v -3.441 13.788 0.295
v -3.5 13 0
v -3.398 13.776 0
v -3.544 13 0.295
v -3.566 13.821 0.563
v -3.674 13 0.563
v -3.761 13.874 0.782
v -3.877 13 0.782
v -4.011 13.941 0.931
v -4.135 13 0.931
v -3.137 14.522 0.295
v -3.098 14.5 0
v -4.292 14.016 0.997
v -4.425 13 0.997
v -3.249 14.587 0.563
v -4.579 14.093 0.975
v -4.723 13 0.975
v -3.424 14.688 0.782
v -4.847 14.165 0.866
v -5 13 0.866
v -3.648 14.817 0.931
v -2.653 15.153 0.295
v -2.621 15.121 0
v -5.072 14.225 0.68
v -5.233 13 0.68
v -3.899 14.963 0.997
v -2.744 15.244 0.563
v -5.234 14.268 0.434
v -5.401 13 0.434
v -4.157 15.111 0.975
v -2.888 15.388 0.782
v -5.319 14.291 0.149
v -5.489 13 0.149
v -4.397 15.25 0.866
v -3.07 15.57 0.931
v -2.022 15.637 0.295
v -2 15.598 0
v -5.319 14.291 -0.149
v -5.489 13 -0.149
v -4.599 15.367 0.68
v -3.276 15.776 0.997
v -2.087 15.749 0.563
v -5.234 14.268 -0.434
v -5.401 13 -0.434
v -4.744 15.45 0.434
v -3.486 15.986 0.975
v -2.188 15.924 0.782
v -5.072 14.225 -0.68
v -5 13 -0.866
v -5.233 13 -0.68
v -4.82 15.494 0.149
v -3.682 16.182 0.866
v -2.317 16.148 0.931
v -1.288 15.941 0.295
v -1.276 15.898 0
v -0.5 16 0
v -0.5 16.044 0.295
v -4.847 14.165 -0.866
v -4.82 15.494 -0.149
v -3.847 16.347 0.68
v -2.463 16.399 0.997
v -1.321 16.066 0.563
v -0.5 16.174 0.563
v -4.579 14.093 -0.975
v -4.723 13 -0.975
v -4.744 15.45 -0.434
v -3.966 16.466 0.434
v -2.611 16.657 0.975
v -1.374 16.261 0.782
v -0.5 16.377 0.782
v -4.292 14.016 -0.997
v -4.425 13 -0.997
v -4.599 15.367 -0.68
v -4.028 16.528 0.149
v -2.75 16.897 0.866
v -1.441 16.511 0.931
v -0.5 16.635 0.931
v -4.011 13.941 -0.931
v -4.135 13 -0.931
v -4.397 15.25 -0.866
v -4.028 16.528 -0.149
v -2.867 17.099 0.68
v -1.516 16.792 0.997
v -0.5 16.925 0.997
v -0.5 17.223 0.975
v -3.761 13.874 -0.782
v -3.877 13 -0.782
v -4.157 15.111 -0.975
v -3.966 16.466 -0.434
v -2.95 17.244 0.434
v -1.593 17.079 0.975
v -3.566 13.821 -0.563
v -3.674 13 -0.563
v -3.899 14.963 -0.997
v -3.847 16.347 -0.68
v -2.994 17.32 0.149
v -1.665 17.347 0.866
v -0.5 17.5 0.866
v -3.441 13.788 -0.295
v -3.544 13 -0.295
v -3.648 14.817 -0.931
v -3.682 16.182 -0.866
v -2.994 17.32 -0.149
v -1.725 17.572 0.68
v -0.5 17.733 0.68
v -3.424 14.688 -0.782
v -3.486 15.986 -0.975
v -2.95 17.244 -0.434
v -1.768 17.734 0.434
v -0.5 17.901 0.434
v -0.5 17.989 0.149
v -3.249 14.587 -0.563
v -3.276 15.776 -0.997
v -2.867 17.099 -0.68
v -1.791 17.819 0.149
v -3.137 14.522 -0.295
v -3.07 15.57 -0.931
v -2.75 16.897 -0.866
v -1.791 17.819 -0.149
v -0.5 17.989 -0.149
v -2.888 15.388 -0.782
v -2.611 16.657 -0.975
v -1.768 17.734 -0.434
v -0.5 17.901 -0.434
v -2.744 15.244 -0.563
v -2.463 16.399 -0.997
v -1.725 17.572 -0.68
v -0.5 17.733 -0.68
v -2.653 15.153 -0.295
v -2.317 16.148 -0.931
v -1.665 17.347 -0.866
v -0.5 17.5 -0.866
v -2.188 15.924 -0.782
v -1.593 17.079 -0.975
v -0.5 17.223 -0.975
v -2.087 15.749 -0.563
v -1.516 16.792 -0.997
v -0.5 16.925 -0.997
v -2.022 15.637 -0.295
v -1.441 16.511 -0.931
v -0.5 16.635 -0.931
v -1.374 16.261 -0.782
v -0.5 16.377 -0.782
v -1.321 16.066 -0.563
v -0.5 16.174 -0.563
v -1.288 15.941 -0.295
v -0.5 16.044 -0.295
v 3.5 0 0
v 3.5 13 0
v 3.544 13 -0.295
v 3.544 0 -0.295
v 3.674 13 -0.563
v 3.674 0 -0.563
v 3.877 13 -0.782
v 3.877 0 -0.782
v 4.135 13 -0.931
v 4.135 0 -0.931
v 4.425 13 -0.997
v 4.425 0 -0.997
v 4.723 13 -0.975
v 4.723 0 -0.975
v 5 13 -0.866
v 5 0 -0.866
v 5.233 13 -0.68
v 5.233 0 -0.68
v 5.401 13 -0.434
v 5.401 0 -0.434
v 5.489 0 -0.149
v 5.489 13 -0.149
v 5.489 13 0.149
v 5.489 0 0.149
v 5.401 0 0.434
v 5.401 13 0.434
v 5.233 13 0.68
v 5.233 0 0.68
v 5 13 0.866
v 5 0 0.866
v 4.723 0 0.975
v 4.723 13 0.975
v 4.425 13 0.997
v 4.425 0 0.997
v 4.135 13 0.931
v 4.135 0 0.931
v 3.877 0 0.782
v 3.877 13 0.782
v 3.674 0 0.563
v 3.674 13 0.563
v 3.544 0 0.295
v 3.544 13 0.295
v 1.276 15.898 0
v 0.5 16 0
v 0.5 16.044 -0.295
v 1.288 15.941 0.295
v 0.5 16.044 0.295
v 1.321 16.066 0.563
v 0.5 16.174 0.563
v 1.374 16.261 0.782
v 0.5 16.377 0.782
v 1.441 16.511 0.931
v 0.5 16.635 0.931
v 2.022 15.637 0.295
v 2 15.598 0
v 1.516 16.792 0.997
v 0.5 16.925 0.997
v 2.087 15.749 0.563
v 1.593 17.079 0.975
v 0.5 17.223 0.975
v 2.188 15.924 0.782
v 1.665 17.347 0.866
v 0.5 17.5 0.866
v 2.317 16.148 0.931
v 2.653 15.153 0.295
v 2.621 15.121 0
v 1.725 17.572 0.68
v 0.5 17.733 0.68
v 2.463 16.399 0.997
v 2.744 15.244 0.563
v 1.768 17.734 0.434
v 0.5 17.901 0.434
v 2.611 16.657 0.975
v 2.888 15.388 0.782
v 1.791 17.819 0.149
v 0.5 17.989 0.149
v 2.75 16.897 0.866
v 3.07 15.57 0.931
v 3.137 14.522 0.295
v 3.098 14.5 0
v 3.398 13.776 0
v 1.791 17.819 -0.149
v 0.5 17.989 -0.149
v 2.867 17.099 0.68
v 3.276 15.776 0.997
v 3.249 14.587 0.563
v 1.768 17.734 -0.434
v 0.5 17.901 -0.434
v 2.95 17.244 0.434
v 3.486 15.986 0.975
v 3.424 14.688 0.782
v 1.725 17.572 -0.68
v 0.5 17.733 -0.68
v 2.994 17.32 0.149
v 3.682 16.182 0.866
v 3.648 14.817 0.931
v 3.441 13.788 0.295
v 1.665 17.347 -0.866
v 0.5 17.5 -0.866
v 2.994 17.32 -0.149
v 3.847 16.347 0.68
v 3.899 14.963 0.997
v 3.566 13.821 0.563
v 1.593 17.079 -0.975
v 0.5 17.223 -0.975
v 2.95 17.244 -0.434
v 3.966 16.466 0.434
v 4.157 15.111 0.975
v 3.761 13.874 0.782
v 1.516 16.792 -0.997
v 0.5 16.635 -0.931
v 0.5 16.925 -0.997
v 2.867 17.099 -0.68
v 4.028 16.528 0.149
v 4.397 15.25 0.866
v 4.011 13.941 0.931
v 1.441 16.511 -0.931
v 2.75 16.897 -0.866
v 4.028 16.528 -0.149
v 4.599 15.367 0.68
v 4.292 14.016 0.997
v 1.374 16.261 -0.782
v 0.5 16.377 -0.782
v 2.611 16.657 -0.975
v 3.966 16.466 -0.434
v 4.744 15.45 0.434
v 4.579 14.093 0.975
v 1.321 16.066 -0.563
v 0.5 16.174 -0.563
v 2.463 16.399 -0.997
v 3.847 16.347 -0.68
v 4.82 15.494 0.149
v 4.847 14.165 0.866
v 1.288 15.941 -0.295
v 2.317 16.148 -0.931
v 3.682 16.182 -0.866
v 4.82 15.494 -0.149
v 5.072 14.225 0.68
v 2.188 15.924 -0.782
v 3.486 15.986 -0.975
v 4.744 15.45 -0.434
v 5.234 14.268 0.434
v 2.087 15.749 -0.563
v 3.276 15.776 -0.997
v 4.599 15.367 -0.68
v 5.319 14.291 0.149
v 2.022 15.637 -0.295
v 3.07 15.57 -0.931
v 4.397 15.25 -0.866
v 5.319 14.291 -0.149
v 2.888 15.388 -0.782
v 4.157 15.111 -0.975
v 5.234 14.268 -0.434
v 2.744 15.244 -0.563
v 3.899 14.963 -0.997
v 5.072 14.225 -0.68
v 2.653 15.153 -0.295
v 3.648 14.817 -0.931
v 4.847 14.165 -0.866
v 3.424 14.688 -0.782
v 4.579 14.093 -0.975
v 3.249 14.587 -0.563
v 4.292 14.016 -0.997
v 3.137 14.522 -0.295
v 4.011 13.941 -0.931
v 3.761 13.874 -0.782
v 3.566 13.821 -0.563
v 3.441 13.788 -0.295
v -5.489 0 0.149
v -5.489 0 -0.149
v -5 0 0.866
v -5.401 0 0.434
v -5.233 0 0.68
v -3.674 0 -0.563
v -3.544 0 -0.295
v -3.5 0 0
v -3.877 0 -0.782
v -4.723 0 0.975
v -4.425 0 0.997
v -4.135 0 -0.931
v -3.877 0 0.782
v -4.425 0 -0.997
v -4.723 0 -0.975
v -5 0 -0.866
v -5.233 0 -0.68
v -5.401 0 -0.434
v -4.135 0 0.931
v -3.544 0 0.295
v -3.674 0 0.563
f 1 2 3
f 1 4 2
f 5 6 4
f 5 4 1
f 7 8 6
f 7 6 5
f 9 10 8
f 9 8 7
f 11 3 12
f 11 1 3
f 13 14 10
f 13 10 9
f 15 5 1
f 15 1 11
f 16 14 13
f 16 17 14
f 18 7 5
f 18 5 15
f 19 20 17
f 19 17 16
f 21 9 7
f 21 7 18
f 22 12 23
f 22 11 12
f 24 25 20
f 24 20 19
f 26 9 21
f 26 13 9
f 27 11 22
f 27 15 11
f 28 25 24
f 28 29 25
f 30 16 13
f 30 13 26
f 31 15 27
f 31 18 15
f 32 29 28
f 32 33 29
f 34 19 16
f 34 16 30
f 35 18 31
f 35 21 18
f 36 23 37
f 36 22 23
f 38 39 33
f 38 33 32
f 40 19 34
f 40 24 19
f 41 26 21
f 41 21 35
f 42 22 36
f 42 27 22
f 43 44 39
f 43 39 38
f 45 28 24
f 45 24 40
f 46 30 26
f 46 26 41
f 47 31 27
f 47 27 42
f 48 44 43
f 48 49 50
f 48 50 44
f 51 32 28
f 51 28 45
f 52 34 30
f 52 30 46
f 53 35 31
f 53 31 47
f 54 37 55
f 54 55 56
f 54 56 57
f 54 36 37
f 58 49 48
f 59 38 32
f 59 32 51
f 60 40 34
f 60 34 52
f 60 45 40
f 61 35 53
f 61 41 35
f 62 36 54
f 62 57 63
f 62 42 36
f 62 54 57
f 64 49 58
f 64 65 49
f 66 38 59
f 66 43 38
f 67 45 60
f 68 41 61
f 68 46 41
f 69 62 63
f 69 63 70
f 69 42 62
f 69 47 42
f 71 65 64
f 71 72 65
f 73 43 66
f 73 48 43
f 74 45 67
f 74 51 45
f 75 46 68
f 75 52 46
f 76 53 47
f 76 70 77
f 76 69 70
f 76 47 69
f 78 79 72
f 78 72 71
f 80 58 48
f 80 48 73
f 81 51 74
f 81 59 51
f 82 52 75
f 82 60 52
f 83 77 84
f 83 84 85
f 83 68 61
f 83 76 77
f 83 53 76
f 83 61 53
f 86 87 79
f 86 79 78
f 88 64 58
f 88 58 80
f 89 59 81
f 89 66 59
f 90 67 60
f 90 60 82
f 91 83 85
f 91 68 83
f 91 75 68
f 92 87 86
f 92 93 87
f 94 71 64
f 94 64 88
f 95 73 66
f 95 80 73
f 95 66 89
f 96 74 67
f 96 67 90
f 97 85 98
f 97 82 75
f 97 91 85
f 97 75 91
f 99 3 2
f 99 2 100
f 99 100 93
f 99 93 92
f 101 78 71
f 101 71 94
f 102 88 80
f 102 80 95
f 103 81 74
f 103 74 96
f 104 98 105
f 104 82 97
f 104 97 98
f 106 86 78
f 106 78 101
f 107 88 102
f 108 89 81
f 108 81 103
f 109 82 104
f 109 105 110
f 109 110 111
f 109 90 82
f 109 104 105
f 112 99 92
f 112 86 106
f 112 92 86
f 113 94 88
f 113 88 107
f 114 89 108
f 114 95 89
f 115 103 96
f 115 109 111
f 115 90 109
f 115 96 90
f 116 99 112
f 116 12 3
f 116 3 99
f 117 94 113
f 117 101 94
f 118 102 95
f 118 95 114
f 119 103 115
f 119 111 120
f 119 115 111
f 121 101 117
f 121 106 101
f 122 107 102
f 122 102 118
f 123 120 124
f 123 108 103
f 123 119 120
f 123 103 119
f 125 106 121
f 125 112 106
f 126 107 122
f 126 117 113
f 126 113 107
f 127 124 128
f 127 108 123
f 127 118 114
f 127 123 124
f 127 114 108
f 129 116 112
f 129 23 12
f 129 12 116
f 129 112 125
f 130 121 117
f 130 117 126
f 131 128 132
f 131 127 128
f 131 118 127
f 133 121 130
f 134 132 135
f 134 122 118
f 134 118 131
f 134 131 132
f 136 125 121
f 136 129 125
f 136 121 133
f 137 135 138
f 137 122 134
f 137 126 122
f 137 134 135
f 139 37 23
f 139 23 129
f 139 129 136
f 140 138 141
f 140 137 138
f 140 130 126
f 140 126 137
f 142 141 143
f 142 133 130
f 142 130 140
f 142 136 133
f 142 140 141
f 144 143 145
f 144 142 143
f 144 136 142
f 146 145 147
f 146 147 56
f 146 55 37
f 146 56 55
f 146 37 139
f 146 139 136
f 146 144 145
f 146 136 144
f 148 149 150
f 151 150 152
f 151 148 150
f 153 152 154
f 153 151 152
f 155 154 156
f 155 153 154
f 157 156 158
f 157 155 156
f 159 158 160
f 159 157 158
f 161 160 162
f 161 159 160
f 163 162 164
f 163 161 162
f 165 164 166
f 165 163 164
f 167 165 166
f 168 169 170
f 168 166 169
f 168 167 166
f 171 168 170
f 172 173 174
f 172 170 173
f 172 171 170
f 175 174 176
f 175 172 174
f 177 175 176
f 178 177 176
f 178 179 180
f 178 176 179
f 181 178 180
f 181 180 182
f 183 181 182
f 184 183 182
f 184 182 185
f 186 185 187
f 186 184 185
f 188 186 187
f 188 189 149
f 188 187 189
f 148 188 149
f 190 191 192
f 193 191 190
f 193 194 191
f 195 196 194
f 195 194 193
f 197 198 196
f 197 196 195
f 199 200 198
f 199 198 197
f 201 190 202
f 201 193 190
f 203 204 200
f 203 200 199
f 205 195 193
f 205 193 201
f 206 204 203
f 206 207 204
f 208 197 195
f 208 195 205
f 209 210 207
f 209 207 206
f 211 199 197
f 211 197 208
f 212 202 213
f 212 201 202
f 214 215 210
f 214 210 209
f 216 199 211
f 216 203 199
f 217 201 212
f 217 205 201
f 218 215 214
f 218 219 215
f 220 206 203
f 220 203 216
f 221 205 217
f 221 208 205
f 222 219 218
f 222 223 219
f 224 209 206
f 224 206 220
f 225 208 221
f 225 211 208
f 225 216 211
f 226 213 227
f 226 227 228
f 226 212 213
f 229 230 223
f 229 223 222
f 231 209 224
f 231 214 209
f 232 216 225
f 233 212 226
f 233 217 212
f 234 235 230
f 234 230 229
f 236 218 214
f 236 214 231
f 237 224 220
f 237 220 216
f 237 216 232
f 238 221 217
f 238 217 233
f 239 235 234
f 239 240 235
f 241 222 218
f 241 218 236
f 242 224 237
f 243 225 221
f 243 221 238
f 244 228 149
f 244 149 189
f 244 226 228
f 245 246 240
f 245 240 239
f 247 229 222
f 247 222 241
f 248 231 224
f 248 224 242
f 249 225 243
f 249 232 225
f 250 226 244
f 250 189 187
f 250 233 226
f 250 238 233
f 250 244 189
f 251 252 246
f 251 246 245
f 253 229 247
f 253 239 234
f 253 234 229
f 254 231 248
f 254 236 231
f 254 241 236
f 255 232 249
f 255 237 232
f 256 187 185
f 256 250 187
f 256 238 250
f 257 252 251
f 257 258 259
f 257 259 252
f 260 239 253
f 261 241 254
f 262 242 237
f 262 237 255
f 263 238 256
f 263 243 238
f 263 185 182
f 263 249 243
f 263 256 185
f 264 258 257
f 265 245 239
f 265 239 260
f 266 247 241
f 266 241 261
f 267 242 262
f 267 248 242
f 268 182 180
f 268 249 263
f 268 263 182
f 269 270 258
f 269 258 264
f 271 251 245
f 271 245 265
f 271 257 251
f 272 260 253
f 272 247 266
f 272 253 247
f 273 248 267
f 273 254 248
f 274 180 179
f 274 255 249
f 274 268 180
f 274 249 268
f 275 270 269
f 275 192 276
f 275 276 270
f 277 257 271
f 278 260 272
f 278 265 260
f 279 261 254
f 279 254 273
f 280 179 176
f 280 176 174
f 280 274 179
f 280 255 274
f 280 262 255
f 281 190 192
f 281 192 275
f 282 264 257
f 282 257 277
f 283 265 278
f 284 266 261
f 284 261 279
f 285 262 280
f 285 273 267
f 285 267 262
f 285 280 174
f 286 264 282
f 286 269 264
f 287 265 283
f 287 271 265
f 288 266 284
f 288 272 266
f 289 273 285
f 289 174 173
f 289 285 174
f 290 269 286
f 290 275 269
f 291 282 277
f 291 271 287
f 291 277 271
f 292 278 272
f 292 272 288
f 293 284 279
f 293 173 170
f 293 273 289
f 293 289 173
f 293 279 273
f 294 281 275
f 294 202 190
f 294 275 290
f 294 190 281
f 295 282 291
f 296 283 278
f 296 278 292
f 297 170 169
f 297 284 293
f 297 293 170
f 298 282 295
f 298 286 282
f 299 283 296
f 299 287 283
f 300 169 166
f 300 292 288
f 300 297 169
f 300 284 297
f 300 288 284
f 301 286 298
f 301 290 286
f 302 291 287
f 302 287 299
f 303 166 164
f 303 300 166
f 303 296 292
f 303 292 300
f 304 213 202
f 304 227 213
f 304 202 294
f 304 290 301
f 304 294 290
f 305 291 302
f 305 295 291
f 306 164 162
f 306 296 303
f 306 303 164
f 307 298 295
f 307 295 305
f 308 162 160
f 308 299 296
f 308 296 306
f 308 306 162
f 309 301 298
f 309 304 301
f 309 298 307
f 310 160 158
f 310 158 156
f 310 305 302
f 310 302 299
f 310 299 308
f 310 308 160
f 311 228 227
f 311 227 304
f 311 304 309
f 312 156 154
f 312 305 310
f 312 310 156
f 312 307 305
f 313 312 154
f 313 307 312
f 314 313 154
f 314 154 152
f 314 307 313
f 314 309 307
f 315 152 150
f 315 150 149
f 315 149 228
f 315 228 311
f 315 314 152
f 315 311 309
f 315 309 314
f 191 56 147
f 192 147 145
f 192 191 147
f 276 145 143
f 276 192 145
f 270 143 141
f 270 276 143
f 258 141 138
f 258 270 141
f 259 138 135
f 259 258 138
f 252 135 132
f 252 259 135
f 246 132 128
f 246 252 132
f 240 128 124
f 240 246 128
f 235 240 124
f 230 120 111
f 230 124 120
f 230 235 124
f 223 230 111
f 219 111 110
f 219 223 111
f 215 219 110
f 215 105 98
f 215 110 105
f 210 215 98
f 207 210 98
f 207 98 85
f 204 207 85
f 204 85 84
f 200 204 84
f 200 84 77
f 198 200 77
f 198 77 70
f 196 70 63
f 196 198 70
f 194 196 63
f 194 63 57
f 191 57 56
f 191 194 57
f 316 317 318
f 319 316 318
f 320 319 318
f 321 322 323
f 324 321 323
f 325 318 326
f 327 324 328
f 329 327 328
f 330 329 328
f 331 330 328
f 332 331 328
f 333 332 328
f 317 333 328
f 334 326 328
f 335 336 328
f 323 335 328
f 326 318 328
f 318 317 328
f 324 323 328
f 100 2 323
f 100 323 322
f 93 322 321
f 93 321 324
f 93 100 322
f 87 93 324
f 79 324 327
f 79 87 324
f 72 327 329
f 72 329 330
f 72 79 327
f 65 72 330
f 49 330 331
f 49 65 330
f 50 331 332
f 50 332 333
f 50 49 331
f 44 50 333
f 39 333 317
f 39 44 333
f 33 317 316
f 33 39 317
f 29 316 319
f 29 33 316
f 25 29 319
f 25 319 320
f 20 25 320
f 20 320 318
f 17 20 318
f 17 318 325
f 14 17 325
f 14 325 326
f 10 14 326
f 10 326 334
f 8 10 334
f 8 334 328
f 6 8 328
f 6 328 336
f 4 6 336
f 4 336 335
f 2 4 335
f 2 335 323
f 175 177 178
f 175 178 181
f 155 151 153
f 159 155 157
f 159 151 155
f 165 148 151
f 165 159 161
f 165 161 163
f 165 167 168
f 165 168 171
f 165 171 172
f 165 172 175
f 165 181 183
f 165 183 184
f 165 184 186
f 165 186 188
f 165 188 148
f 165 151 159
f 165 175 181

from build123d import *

# Parameters (mm, degrees)
BALAYAGE1_PROFILE_R = 1


with BuildPart() as part:
    # Balayage1: sweep along a path in Esquisse1
    with BuildLine(Plane.XY) as balayage1_path:
        Line((-4.5, 0), (-4.5, 13))
        ThreePointArc((-4.5, 13), (-3.328427125, 15.828427125), (-0.5, 17))
        Line((-0.5, 17), (0.5, 17))
        ThreePointArc((0.5, 17), (3.328427125, 15.828427125), (4.5, 13))
        Line((4.5, 13), (4.5, 0))
    # Balayage1 profile (on start of the path) → Balayage1 (sweep)
    with BuildSketch(Plane(origin=(-4.5, 0, 0), x_dir=(1, 0, 0), z_dir=(0, 1, 0))):
        Circle(BALAYAGE1_PROFILE_R)
    sweep(path=balayage1_path.line)


solid = part.part
